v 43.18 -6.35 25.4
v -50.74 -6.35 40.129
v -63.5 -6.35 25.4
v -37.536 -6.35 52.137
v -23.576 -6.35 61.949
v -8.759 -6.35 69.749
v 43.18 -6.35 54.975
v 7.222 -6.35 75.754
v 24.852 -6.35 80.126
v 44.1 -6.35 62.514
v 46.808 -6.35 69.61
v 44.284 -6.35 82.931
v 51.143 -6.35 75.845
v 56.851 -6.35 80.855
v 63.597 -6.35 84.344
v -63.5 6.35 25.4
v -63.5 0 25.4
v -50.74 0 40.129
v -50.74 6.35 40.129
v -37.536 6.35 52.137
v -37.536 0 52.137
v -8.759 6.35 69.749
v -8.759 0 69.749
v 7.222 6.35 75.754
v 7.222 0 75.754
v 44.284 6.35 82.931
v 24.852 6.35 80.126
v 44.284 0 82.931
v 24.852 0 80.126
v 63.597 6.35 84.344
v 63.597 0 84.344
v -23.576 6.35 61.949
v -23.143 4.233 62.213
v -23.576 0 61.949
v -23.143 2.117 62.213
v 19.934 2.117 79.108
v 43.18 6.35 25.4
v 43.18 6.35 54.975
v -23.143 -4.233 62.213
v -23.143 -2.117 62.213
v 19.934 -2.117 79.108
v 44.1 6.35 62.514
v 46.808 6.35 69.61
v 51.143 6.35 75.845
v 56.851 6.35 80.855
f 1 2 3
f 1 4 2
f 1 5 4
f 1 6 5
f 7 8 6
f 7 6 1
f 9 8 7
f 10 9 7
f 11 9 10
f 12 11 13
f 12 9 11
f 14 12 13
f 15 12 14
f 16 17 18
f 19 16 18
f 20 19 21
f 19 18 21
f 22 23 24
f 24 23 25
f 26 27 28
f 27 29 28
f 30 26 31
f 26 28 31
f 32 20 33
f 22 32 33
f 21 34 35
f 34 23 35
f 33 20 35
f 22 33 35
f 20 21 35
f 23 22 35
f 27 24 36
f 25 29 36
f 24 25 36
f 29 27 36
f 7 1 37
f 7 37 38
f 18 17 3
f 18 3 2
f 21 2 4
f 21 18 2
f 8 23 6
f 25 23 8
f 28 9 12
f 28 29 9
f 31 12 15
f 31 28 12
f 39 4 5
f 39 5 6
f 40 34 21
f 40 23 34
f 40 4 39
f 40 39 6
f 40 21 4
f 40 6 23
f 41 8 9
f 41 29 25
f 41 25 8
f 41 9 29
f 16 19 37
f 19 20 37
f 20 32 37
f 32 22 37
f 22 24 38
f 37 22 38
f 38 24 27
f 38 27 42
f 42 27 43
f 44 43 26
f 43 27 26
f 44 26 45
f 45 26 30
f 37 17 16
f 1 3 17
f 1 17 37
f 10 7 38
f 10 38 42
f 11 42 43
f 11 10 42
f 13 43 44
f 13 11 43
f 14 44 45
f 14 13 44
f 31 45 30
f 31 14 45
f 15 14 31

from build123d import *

# Parameters (mm, degrees)
F1_DEPTH = 6.35


with BuildPart() as f1:
    # F0 (on Front) → F1 (new body, symmetric)
    with BuildSketch(Plane.XZ):
        with BuildLine():
            Line((-63.5, 25.4), (43.18, 25.4))
            Line((43.18, 25.4), (43.18, 54.975352))
            ThreePointArc((43.18, 54.975352), (48.785666, 72.859274), (63.596736, 84.343627))
            add(Edge.make_bspline(
                [(-63.5, 25.4), (-25.21287, 74.923909), (20.350938, 82.18553), (63.596736, 84.343627)],
                knots=[0, 0, 0, 0, 132.266939, 132.266939, 132.266939, 132.266939], degree=3))
        make_face()
    extrude(amount=F1_DEPTH, both=True)


solid = f1.part
